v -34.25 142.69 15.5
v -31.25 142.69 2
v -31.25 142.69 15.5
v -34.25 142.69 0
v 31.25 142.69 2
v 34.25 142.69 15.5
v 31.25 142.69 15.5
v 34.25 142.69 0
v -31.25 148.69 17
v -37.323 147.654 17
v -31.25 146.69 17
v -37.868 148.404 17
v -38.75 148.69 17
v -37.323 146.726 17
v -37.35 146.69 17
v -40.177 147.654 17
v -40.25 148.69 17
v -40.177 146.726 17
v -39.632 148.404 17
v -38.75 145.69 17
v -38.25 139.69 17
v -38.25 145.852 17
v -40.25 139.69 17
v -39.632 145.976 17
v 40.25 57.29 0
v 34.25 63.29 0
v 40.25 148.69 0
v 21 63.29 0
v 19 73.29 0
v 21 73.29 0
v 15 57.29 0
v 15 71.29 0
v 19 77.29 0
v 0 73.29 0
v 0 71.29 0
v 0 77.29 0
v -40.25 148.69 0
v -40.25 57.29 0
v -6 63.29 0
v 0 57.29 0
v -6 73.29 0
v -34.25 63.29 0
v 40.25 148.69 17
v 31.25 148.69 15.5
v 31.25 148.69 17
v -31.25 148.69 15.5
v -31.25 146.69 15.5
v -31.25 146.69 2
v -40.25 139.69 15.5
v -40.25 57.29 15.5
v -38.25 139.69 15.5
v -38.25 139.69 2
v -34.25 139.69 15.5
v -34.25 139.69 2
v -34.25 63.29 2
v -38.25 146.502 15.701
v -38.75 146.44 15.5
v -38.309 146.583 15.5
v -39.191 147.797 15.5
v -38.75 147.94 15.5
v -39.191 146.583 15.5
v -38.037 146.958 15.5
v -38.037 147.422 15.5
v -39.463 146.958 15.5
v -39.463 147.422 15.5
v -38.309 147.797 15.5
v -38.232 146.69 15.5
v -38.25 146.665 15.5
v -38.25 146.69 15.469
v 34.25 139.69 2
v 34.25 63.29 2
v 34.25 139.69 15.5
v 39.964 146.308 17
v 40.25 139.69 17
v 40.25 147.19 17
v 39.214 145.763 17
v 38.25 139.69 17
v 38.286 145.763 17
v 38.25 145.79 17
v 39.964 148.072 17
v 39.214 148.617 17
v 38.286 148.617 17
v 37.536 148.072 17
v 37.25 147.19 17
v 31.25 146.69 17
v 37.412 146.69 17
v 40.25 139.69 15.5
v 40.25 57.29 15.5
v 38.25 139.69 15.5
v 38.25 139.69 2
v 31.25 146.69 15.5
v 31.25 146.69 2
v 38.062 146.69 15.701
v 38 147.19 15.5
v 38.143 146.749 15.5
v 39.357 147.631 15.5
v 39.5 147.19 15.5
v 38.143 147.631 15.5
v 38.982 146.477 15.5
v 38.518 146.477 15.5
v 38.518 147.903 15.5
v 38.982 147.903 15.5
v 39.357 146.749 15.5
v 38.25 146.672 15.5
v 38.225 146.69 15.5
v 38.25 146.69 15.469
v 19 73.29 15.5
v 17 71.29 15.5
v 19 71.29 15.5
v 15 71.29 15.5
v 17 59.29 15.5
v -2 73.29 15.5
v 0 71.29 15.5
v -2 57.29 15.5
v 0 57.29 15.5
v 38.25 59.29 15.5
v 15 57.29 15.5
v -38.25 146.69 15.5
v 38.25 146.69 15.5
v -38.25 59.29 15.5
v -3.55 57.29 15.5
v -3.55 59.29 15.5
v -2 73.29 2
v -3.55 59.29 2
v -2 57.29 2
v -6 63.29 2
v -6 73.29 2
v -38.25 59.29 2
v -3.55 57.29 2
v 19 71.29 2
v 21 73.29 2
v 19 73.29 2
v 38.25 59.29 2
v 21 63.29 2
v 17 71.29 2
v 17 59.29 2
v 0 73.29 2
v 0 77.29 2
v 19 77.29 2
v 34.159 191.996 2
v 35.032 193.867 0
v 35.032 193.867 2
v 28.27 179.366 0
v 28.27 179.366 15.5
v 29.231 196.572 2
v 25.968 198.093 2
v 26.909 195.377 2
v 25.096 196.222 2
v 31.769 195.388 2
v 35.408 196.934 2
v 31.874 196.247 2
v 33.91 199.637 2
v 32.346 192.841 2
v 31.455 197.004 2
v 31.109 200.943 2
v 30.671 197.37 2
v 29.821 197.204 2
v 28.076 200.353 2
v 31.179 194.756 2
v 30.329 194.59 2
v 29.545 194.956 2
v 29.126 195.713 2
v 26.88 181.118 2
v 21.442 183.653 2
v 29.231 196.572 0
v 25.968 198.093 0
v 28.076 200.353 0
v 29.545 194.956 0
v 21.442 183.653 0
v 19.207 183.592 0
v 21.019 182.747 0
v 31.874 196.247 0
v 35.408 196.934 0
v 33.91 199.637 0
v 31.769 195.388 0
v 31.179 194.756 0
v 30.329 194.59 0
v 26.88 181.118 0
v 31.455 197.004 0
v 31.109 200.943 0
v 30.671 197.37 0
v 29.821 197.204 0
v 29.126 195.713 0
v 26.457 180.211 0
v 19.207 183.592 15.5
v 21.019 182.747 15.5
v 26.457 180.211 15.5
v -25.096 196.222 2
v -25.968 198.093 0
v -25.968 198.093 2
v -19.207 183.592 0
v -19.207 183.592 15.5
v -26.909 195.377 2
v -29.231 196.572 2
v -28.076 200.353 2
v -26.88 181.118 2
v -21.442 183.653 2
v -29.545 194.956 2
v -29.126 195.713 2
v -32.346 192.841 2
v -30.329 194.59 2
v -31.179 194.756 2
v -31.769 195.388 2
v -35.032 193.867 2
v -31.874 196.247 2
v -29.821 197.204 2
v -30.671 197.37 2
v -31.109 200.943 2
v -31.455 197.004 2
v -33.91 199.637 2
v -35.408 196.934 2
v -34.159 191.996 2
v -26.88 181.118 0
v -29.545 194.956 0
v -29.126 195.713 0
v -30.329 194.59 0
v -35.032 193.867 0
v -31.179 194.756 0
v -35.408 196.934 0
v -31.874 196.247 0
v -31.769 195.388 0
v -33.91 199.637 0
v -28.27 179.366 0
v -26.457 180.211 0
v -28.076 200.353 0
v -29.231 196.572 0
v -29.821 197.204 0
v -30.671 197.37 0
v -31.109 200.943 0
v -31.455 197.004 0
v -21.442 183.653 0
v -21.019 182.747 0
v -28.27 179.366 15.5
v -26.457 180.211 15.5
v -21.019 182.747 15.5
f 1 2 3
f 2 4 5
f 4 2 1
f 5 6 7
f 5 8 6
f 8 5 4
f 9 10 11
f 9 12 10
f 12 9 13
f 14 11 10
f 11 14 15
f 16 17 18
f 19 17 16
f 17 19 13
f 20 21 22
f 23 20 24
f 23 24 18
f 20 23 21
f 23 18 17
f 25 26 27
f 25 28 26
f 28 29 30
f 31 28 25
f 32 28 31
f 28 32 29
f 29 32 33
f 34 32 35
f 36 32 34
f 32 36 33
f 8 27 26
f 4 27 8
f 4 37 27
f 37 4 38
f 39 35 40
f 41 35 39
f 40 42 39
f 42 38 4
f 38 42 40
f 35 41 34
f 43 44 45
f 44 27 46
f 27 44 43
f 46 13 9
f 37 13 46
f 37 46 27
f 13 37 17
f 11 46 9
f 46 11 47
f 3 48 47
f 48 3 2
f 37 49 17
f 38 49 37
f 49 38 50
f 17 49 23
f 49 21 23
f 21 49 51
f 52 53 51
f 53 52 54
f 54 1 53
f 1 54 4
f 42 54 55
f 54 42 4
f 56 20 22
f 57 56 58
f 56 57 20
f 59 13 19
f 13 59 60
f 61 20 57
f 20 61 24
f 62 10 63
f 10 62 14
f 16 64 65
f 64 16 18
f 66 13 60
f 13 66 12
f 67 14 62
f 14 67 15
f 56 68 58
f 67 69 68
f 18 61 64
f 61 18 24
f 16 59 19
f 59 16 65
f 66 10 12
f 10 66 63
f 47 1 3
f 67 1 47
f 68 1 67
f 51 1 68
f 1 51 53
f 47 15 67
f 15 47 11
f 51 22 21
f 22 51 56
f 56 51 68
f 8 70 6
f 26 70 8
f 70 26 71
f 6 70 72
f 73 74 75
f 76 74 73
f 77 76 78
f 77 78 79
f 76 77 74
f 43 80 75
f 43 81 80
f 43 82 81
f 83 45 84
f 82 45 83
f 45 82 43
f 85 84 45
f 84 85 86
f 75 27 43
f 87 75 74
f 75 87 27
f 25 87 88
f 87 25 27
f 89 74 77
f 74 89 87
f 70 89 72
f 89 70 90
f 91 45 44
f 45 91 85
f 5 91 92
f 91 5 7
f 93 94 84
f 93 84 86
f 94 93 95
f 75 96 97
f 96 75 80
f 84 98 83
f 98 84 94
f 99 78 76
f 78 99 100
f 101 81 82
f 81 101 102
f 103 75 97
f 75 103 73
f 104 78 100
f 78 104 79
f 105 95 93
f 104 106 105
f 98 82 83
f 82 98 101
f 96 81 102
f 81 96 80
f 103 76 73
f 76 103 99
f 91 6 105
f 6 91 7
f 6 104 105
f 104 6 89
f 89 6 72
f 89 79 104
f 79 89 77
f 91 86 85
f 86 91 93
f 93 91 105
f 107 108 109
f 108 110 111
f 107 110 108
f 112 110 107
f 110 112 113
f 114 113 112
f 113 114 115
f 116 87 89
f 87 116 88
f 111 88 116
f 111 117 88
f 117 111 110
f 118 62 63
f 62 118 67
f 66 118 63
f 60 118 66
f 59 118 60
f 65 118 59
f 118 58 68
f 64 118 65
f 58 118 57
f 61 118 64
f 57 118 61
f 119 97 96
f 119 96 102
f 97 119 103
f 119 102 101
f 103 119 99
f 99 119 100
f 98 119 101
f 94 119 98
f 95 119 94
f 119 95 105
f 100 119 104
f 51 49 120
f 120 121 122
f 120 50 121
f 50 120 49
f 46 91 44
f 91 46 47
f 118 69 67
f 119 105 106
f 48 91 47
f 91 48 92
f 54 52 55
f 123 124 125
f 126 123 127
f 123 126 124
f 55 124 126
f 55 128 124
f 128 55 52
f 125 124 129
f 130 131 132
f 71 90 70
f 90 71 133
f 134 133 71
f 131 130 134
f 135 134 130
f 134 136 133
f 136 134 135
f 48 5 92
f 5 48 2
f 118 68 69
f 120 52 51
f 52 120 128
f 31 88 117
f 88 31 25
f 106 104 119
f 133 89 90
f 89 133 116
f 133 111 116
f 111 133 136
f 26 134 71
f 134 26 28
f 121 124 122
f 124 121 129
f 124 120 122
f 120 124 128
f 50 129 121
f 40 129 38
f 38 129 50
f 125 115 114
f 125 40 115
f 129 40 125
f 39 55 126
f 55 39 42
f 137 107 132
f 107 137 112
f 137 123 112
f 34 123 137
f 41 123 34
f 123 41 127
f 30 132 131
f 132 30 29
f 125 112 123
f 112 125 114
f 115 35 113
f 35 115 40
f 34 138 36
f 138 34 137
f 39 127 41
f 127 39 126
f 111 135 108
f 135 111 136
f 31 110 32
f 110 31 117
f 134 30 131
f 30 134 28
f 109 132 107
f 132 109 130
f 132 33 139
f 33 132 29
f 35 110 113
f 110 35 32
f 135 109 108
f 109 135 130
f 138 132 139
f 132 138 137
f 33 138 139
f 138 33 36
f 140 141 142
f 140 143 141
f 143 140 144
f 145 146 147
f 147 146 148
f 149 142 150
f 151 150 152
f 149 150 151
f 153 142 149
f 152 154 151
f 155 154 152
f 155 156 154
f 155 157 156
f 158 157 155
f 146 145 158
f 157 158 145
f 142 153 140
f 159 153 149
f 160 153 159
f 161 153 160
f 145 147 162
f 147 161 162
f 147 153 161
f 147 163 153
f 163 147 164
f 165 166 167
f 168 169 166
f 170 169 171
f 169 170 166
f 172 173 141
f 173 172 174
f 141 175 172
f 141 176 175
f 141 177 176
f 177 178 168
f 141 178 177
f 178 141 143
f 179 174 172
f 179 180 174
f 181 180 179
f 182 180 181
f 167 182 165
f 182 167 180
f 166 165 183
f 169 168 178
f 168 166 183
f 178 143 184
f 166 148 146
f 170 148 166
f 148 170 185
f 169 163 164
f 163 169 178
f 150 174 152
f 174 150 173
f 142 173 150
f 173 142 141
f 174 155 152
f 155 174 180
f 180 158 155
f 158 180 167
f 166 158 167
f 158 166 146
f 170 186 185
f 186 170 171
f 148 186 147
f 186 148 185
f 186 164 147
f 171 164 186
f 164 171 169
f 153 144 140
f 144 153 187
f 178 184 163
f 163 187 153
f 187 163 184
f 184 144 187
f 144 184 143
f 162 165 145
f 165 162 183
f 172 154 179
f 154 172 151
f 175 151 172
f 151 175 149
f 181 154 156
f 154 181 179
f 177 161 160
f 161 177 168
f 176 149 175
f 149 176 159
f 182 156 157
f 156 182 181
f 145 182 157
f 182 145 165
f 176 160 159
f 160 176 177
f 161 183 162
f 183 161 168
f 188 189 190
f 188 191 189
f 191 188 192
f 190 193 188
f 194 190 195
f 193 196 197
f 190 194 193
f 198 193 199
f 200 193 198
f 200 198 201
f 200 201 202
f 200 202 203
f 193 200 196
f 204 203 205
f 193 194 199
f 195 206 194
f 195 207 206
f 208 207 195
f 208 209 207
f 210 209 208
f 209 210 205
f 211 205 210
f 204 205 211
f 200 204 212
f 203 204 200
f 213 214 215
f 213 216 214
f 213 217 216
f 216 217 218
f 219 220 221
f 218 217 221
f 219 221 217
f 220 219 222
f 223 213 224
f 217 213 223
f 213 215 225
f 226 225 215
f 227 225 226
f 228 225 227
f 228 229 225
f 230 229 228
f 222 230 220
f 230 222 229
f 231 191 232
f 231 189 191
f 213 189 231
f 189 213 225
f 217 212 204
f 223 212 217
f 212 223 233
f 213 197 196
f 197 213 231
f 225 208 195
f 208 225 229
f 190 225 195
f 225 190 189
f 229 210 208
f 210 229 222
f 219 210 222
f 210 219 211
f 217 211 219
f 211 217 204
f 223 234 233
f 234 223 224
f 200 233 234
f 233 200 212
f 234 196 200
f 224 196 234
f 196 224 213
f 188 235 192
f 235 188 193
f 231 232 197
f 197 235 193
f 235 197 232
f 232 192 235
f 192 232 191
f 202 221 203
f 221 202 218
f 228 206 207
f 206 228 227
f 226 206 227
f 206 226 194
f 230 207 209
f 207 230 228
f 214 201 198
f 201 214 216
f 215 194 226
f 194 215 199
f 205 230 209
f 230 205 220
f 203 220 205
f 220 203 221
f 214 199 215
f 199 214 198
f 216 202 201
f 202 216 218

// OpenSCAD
/* File: PODboardframe.scad
 * Author: deh
 * Latest edit: 2017012418.12
 */
 $fn=10;
 
 // Inside dimensions of Plano box
 plano_len          = 152.5;   // flat-flat
 plano_wid          =  75.7;   // flat-flat
 
 // Stud magnet relative postions.
 // Bottom magnet is on center-line and x,y reference is 0,0
 plano_mag_top_x  = 30.5;     // Top pair x +/- from center-line (C/L)
 plano_mag_top_y  = 138.69;   // Top pair y from bottom magnet hole
 plano_mag_top_ofs = 10;    // Top mags to top edge of PC board max
 
 plano_offs_mag_y   = 4;    // Offset from edge for magnet hole
 plano_offs_mag_x   = 4;    // Offset from edge for magnet hole
 plano_ctr_y    = (plano_len/2);
 plano_ctr_x    = (plano_wid/2);
 plano_mag_stud = 2.8;  // Dia of mounting magnet studs (4-40)
 
 // POD board
 pod_wid=76.5;  // Overall width
 pod_len=89.4;  // Overall length
 
 RJ_offset=24.8; // Side of RJ45 jack from edge
 RJ_wid=15;      // Width of RJ 45 jack
 RJ_depth=14.5;  // Bottom of POD pc board to bottom of RJ45
 RJ_length=14;  // Front-Back length
 
 // CAN sub-board module
 sub_wid      = 33.75;  // Overall width
 sub_len      = 62.9;   // Overall lengh
 sub_mtg_wid  = 26.6;   // Between mounting holes, width
 sub_mtg_len  = 57.0;   // Between mounting holes, length 
 
 // Switcher module
 sw_wid =   20.3;   // Overall width
 sw_len =   41.2;   // Overall length
 sw_mtg_off_out_y   = 5.56; // Offset from edge "out" mounting hole 
 sw_mtg_off_out_x   = 2.7;  // Offset from edge "out" mounting hole 
 sw_mtg_off_in_y    = 3.1;  // Offset from edge "in" mounting hole
 sw_mtg_off_in_x    = 6.0;  // Offset from edge "in" mounting hole
 
 // RJ jack
 rj_grv =  4.0;  // Groove Depth 
 rj_ht  = 14.2;  // Groove Length
 rj_wid = 14.2;  // Groove Height
 
 // Post ridge
 p_ridge = 1.5; // Height of ridge to position PC board on post
 p_offset = 2;  // Offset of ridge from edge of post
 
 // Pod post
 pod_post_ht = (RJ_depth + 1);
 pod_post_y = 9;    // Length in "y" (long/length) box direction)
 pod_post_x = 6;    // Length in "x" (short/width) box direction)
 pod_post_z = 1.55; // Height of ridge
 pod_post_q = 1.5;  // Width of ridge
 pod_post_s = 2;    // Screw hole dia
 pod_post_sd = 4;   // Screw hole depth
 
 // Web 
 web_thick  = 2.0;  // Thickness of the web between posts
 web_wid_x  = pod_post_x;    // Width of web
 web_wid_y  = pod_post_ht;   // Height of web
 
 // Some computed values
 pc_cornerx =  (pod_wid/2) + p_offset;  // PC board corner
 pc_cornery =      pod_len + p_offset;
 
// Post with recess for corner of POD board
 module pod_post()
 {
     difference()
     {
         union()
         {
            cube([pod_post_x, pod_post_y, pod_post_ht + p_ridge],false);
            cube([pod_post_y, pod_post_x, pod_post_ht + p_ridge],false);
         }
         union()
         {
            // Self tapping screw hole
            translate([1.5, 1.5, 14])
                cylinder(h = pod_post_sd, r1 = 0, r2 = pod_post_s, center = false);
            // Cut-out for corner of PC board
            translate([p_offset, p_offset, pod_post_ht])
                cube([ pod_post_x - p_offset, pod_post_y-p_offset, p_ridge],false);
            translate([p_offset, p_offset, pod_post_ht])
                cube([ pod_post_y - p_offset, pod_post_x-p_offset, p_ridge],false);
         }
     }        
 }

  module pod_4posts()
 {
//    translate ([-pc_cornerx,      0, 0]) rotate(  0) pod_post();
    //translate ([ pc_cornerx,      0, 0]) rotate( 90) pod_post();
    translate ([-pc_cornerx,pc_cornery, 0]) rotate(-90) pod_post();
    translate ([ pc_cornerx,pc_cornery, 0]) rotate(180) pod_post();

 }
 
 module web(length)
 {
     cube([length, web_thick, web_wid_y]);
     cube([length, web_wid_x, web_thick]);     
 }
 
 
 module frame_pod()
 {
     union()
     {
        pod_4posts();
/*        translate([-pc_cornerx,      0, 0])
            web(pc_cornerx * 2);
*/         
        translate([pc_cornerx, pc_cornery, 0])
            rotate(180)
                web(pc_cornerx * 2);
        translate([-pc_cornerx, pc_cornery, 0])
            rotate(-90)
                web(pc_cornery);
        translate([ pc_cornerx, 0, 0])
            rotate( 90)
                web(pc_cornery);
        translate([ pc_cornerx - RJ_offset, 0, 0])
            rotate( 0)
                web(RJ_offset);  
         translate([ -pc_cornerx , 0, 0])
            rotate( 0)
                web(pod_wid - RJ_offset - RJ_wid);
     


     }
 }

  module plano_mag_tabs()
 {
     mag_tab(); // Bottom mag, reference is 0,0,0
     
     translate([ (plano_mag_top_x + plano_wid/2),
                 plano_mag_top_y + plano_mag_top_x,
                0])
                mag_tab();
     translate([-(plano_mag_top_x + plano_wid/2),
                 plano_mag_top_y + plano_mag_top_x,
                0])
                mag_tab();
} 
 module mag_tab()
 {
     difference() // Tabs around magnet holes
     {
         cylinder(2, 5, 5, false);
         cylinder(3, plano_mag_stud/2,plano_mag_stud/2, false);
     }
 }
 module wedge_side(l, w, h)
 {
       polyhedron(
               points=[[0,0,0], [l,0,0], [l,w,0], [0,w,0], [0,w,h], [l,w,h]],
               faces=[[0,1,2,3],[5,4,3,2],[0,4,5,1],[0,3,4],[5,2,1]]
               );
 }
 
 module mag_tab_end() // Tabs at top end
 {
     {   union()
         {
             difference()
             { 
                 union()
                 {
                    width_flat = 10;
                    wedge_side = 16;
                    translate([-width_flat/2,-15,0])
                    cube([width_flat,15,2],false);
                    cylinder(2, 5, 5, false);
                    translate([-width_flat/2+2,0,0])
                    rotate(180,0,0)wedge_side(2,wedge_side,pod_post_ht);
                    translate([ width_flat/2,0,0])
                    rotate(180,0,0)wedge_side(2,wedge_side,pod_post_ht);
                 }
                 cylinder(3, plano_mag_stud/2,plano_mag_stud/2, false);
             }
         }
     }
 }
 module mag_tab_1()
 {
         translate([ plano_mag_top_x,
                 plano_mag_top_y,
                0])
                rotate([0,0,-25])mag_tab_end();
         translate([-plano_mag_top_x,
                 plano_mag_top_y,
                0])
                rotate([0,0,25])mag_tab_end();
     
 }
module RJ45box()
 {
        rjy = RJ_length + web_thick;
        rotate(90) web(rjy);
        translate ([RJ_wid, rjy, 0]) 
            rotate(-90) web(rjy); 
        translate([0, RJ_length, 0]) web(RJ_wid+4); // Back
 }

module frame_w_RJ45box()
{
	translate([0,0,0])
            frame_pod();
        translate([0,0,0])RJ45box();  
 
         mag_tab_1();            

}
 

 module frame_total()
 {
	// Position frame near top of plano box
	frame_total_y = plano_mag_top_y + plano_mag_top_ofs - pc_cornery;
	translate([0,frame_total_y,0])
	   frame_w_RJ45box();
 }
 
 frame_total();
